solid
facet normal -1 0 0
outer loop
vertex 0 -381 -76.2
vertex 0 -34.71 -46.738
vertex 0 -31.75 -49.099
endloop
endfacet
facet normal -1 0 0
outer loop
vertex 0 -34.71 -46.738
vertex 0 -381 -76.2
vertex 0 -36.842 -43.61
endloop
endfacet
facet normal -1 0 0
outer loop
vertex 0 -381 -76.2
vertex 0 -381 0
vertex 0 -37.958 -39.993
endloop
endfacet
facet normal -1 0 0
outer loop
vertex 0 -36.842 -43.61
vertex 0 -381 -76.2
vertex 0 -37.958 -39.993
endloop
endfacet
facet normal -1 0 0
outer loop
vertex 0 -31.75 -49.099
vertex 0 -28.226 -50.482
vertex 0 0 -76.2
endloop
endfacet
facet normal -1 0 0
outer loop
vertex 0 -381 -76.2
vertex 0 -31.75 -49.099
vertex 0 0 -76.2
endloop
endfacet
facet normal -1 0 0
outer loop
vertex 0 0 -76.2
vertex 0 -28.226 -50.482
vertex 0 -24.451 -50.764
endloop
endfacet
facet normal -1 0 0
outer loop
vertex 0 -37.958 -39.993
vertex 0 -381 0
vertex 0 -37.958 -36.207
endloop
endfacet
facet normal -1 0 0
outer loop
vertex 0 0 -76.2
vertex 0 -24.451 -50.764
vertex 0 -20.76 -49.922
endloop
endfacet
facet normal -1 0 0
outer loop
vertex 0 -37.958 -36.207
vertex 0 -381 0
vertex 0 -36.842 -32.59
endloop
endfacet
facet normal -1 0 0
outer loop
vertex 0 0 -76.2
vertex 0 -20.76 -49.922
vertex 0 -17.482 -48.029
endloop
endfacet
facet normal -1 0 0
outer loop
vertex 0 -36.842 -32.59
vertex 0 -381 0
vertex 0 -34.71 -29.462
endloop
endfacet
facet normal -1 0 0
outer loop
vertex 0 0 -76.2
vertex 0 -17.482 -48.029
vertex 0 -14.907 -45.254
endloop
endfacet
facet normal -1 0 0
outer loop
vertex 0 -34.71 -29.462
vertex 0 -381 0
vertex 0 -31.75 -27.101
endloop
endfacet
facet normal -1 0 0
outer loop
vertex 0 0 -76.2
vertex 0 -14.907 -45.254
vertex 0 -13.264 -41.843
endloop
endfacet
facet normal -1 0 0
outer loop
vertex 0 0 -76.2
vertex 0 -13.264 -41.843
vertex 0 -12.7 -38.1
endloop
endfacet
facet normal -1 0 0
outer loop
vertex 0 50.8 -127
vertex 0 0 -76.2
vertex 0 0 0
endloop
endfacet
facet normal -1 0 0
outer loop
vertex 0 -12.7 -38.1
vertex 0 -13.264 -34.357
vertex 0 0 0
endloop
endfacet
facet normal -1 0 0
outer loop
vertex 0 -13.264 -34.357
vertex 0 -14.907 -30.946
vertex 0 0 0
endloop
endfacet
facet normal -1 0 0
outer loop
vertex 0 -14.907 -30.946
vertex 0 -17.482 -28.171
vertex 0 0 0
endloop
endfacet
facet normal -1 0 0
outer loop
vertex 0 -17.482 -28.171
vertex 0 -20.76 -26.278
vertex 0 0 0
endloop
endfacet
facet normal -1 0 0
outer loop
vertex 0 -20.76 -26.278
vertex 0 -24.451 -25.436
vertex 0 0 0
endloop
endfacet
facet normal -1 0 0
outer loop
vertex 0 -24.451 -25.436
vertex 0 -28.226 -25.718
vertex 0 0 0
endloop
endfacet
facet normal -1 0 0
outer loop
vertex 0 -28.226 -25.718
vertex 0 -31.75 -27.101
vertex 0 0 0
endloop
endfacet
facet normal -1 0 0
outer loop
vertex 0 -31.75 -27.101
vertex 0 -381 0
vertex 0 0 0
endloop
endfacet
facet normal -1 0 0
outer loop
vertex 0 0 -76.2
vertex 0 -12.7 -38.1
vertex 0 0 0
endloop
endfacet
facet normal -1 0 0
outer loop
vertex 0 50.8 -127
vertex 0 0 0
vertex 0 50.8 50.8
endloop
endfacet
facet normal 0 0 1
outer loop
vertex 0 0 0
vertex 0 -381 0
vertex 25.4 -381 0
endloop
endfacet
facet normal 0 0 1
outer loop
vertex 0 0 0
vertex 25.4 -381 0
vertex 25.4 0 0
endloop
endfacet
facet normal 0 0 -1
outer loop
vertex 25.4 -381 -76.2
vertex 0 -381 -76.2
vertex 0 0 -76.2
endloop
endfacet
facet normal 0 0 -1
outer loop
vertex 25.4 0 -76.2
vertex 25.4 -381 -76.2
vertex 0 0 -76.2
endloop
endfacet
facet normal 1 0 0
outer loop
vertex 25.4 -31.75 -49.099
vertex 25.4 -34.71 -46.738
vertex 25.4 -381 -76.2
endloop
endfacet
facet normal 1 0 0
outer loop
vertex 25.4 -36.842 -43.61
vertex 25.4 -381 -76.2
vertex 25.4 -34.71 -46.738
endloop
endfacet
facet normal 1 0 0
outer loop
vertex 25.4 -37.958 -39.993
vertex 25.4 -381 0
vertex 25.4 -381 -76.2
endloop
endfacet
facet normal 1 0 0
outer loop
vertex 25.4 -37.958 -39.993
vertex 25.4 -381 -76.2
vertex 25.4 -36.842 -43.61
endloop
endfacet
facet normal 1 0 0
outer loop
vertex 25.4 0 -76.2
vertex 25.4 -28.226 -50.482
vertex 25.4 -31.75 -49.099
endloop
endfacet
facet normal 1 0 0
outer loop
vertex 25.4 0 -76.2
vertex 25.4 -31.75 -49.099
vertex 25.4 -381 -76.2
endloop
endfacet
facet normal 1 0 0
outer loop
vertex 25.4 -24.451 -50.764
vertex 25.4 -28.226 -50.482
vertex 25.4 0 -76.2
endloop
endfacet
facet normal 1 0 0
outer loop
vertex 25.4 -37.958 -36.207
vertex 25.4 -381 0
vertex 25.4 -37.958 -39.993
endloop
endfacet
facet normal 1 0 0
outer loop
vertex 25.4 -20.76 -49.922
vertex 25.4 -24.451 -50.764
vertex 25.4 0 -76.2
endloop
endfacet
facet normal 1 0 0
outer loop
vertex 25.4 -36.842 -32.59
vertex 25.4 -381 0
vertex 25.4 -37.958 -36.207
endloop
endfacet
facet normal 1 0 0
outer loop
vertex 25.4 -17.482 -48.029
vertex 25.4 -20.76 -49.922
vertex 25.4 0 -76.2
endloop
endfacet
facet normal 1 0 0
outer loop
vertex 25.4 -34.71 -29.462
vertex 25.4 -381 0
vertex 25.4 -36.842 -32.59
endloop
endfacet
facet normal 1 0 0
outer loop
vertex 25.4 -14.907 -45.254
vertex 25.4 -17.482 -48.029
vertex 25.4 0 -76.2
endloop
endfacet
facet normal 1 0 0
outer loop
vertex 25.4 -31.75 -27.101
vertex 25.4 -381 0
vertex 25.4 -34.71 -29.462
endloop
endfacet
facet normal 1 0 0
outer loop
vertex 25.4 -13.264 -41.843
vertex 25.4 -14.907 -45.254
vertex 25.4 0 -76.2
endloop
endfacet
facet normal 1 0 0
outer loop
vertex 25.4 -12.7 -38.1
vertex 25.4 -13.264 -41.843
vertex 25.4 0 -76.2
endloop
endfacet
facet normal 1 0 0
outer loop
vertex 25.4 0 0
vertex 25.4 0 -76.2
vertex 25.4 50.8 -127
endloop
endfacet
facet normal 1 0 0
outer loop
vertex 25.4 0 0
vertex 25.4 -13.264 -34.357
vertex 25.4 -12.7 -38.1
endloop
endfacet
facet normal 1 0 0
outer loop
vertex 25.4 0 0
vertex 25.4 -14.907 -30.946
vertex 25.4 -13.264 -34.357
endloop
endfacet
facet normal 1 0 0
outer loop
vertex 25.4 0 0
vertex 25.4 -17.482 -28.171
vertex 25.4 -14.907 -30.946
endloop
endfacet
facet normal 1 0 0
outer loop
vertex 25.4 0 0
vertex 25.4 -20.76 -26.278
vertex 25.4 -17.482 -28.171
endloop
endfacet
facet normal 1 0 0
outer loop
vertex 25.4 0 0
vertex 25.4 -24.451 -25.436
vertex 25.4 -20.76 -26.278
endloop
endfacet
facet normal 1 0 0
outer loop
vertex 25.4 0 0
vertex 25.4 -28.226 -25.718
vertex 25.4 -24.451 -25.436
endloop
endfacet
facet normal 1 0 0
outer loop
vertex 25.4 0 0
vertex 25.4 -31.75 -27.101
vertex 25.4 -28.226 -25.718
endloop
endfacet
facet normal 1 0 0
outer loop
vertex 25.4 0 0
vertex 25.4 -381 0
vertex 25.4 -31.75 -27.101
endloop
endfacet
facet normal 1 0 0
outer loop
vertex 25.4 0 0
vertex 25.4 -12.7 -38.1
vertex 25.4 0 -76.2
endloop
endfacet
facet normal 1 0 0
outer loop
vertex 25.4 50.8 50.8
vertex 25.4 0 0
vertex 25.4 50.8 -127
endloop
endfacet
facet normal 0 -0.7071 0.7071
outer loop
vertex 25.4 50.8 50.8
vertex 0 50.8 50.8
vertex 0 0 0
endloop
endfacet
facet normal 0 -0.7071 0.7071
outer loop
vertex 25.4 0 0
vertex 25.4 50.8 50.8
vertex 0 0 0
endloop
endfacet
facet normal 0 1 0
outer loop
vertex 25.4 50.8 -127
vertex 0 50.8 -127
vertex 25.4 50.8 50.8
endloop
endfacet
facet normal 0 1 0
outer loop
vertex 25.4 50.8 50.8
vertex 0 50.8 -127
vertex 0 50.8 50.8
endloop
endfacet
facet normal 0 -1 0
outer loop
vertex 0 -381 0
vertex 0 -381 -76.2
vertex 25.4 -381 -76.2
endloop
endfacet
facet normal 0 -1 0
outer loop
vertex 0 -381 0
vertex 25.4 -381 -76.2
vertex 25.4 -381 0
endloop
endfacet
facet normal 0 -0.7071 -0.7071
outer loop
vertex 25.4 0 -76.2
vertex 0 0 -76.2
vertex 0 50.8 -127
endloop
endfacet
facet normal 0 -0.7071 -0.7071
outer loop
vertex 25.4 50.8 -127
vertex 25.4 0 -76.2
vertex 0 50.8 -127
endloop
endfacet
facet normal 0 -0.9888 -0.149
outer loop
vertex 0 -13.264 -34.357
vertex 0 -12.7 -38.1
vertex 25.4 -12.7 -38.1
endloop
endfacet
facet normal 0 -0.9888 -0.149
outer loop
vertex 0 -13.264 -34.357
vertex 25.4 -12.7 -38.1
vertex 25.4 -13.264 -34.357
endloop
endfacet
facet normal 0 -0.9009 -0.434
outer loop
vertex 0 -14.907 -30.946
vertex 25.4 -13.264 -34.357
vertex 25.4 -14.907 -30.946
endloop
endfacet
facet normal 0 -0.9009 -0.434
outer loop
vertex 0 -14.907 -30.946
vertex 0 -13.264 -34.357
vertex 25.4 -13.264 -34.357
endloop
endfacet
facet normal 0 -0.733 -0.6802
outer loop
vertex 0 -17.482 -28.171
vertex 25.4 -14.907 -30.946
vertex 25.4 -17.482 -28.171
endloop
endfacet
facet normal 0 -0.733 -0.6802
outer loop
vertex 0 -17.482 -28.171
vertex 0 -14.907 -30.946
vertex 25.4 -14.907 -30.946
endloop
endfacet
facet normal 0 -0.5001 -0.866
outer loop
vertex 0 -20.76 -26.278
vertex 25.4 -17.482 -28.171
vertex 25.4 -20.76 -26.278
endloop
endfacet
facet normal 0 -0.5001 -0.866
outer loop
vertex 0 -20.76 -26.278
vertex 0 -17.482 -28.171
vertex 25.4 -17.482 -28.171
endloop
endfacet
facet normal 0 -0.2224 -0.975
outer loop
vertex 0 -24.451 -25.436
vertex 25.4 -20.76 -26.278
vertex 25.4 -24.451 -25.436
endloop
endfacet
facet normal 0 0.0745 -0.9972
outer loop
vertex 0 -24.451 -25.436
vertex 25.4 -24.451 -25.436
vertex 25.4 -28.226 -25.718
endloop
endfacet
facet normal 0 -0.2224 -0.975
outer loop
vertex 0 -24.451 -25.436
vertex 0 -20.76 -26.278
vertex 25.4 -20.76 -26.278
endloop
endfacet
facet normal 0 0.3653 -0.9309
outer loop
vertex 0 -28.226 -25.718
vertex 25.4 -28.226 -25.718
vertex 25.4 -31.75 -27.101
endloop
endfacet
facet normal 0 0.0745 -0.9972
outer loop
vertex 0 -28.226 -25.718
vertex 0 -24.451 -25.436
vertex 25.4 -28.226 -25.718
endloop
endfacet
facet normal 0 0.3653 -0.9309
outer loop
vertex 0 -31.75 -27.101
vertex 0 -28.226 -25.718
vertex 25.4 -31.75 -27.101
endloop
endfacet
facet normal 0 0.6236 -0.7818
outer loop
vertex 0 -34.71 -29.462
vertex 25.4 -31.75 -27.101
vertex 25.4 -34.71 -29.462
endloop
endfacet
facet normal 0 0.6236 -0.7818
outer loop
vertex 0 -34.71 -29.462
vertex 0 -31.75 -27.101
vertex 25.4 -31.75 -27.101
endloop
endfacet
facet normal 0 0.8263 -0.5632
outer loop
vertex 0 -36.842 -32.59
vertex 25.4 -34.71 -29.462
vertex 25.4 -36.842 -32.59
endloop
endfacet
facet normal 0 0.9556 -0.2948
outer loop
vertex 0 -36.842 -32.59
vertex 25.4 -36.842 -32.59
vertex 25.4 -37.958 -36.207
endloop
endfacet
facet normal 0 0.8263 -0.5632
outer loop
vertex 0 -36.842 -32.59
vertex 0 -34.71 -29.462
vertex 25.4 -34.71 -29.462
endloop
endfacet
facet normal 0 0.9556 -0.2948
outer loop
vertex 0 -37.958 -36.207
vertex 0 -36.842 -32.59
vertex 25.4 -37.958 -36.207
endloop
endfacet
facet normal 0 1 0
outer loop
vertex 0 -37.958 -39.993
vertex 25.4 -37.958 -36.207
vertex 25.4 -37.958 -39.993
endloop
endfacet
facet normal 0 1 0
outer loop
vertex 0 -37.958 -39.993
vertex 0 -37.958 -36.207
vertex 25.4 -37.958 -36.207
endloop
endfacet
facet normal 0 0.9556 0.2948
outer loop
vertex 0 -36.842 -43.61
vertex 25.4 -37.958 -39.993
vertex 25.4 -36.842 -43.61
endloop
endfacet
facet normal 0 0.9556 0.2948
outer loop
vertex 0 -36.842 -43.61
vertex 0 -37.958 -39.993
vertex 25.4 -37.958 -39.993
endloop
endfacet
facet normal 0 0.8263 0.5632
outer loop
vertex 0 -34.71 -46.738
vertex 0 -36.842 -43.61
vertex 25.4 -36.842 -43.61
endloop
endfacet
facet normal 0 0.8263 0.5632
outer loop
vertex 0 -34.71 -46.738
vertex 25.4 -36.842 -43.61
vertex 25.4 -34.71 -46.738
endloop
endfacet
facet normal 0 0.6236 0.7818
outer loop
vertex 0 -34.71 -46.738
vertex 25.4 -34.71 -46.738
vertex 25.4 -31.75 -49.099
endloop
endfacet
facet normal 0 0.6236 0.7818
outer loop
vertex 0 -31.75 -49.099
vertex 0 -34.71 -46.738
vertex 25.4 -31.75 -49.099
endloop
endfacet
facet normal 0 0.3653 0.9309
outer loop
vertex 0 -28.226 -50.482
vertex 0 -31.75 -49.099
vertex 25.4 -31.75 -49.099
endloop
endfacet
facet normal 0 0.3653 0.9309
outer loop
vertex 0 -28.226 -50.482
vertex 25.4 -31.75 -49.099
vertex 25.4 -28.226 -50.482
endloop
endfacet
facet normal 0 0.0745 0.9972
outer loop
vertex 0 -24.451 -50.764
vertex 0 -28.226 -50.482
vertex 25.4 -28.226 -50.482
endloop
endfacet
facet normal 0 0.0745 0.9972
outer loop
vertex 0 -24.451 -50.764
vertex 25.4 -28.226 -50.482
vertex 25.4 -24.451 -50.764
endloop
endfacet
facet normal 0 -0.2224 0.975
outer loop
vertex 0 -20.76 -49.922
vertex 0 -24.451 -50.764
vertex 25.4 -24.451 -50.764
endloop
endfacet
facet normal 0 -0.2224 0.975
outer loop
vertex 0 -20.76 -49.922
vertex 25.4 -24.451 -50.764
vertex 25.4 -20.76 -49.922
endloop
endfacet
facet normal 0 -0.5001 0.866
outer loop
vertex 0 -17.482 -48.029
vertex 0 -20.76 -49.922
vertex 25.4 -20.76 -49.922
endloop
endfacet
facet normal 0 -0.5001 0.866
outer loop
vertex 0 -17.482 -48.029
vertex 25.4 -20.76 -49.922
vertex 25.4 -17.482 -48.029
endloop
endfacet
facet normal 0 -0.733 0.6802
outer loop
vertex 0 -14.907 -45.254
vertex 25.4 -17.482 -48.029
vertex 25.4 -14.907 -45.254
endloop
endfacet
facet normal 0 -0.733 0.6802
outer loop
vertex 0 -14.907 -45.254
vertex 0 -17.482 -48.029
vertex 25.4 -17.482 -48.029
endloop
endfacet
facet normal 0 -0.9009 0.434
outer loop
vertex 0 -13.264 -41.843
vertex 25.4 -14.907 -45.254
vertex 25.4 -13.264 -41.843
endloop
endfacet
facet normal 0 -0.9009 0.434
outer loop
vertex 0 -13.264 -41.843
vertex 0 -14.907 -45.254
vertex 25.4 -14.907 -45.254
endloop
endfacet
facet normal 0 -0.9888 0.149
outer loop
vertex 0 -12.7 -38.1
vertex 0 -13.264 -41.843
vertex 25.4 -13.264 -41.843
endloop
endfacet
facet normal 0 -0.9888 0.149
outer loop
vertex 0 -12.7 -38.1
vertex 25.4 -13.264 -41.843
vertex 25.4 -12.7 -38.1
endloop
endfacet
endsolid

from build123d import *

# Parameters (mm, degrees)
F0_W     = 381
F0_H     = 76.2
F0_R     = 12.7
F1_DEPTH = 25.4


with BuildPart() as f1:
    # F0 (on Right) → F1 (new body)
    with BuildSketch(Plane.YZ):
        with Locations((-190.5, -38.1)):
            Rectangle(F0_W, F0_H)
        with Locations((-25.4, -38.1)):
            Circle(F0_R, mode=Mode.SUBTRACT)
        Polygon((50.8, 50.8), (0, 0), (0, -76.2), (50.8, -127), align=None)
    extrude(amount=F1_DEPTH)


solid = f1.part
